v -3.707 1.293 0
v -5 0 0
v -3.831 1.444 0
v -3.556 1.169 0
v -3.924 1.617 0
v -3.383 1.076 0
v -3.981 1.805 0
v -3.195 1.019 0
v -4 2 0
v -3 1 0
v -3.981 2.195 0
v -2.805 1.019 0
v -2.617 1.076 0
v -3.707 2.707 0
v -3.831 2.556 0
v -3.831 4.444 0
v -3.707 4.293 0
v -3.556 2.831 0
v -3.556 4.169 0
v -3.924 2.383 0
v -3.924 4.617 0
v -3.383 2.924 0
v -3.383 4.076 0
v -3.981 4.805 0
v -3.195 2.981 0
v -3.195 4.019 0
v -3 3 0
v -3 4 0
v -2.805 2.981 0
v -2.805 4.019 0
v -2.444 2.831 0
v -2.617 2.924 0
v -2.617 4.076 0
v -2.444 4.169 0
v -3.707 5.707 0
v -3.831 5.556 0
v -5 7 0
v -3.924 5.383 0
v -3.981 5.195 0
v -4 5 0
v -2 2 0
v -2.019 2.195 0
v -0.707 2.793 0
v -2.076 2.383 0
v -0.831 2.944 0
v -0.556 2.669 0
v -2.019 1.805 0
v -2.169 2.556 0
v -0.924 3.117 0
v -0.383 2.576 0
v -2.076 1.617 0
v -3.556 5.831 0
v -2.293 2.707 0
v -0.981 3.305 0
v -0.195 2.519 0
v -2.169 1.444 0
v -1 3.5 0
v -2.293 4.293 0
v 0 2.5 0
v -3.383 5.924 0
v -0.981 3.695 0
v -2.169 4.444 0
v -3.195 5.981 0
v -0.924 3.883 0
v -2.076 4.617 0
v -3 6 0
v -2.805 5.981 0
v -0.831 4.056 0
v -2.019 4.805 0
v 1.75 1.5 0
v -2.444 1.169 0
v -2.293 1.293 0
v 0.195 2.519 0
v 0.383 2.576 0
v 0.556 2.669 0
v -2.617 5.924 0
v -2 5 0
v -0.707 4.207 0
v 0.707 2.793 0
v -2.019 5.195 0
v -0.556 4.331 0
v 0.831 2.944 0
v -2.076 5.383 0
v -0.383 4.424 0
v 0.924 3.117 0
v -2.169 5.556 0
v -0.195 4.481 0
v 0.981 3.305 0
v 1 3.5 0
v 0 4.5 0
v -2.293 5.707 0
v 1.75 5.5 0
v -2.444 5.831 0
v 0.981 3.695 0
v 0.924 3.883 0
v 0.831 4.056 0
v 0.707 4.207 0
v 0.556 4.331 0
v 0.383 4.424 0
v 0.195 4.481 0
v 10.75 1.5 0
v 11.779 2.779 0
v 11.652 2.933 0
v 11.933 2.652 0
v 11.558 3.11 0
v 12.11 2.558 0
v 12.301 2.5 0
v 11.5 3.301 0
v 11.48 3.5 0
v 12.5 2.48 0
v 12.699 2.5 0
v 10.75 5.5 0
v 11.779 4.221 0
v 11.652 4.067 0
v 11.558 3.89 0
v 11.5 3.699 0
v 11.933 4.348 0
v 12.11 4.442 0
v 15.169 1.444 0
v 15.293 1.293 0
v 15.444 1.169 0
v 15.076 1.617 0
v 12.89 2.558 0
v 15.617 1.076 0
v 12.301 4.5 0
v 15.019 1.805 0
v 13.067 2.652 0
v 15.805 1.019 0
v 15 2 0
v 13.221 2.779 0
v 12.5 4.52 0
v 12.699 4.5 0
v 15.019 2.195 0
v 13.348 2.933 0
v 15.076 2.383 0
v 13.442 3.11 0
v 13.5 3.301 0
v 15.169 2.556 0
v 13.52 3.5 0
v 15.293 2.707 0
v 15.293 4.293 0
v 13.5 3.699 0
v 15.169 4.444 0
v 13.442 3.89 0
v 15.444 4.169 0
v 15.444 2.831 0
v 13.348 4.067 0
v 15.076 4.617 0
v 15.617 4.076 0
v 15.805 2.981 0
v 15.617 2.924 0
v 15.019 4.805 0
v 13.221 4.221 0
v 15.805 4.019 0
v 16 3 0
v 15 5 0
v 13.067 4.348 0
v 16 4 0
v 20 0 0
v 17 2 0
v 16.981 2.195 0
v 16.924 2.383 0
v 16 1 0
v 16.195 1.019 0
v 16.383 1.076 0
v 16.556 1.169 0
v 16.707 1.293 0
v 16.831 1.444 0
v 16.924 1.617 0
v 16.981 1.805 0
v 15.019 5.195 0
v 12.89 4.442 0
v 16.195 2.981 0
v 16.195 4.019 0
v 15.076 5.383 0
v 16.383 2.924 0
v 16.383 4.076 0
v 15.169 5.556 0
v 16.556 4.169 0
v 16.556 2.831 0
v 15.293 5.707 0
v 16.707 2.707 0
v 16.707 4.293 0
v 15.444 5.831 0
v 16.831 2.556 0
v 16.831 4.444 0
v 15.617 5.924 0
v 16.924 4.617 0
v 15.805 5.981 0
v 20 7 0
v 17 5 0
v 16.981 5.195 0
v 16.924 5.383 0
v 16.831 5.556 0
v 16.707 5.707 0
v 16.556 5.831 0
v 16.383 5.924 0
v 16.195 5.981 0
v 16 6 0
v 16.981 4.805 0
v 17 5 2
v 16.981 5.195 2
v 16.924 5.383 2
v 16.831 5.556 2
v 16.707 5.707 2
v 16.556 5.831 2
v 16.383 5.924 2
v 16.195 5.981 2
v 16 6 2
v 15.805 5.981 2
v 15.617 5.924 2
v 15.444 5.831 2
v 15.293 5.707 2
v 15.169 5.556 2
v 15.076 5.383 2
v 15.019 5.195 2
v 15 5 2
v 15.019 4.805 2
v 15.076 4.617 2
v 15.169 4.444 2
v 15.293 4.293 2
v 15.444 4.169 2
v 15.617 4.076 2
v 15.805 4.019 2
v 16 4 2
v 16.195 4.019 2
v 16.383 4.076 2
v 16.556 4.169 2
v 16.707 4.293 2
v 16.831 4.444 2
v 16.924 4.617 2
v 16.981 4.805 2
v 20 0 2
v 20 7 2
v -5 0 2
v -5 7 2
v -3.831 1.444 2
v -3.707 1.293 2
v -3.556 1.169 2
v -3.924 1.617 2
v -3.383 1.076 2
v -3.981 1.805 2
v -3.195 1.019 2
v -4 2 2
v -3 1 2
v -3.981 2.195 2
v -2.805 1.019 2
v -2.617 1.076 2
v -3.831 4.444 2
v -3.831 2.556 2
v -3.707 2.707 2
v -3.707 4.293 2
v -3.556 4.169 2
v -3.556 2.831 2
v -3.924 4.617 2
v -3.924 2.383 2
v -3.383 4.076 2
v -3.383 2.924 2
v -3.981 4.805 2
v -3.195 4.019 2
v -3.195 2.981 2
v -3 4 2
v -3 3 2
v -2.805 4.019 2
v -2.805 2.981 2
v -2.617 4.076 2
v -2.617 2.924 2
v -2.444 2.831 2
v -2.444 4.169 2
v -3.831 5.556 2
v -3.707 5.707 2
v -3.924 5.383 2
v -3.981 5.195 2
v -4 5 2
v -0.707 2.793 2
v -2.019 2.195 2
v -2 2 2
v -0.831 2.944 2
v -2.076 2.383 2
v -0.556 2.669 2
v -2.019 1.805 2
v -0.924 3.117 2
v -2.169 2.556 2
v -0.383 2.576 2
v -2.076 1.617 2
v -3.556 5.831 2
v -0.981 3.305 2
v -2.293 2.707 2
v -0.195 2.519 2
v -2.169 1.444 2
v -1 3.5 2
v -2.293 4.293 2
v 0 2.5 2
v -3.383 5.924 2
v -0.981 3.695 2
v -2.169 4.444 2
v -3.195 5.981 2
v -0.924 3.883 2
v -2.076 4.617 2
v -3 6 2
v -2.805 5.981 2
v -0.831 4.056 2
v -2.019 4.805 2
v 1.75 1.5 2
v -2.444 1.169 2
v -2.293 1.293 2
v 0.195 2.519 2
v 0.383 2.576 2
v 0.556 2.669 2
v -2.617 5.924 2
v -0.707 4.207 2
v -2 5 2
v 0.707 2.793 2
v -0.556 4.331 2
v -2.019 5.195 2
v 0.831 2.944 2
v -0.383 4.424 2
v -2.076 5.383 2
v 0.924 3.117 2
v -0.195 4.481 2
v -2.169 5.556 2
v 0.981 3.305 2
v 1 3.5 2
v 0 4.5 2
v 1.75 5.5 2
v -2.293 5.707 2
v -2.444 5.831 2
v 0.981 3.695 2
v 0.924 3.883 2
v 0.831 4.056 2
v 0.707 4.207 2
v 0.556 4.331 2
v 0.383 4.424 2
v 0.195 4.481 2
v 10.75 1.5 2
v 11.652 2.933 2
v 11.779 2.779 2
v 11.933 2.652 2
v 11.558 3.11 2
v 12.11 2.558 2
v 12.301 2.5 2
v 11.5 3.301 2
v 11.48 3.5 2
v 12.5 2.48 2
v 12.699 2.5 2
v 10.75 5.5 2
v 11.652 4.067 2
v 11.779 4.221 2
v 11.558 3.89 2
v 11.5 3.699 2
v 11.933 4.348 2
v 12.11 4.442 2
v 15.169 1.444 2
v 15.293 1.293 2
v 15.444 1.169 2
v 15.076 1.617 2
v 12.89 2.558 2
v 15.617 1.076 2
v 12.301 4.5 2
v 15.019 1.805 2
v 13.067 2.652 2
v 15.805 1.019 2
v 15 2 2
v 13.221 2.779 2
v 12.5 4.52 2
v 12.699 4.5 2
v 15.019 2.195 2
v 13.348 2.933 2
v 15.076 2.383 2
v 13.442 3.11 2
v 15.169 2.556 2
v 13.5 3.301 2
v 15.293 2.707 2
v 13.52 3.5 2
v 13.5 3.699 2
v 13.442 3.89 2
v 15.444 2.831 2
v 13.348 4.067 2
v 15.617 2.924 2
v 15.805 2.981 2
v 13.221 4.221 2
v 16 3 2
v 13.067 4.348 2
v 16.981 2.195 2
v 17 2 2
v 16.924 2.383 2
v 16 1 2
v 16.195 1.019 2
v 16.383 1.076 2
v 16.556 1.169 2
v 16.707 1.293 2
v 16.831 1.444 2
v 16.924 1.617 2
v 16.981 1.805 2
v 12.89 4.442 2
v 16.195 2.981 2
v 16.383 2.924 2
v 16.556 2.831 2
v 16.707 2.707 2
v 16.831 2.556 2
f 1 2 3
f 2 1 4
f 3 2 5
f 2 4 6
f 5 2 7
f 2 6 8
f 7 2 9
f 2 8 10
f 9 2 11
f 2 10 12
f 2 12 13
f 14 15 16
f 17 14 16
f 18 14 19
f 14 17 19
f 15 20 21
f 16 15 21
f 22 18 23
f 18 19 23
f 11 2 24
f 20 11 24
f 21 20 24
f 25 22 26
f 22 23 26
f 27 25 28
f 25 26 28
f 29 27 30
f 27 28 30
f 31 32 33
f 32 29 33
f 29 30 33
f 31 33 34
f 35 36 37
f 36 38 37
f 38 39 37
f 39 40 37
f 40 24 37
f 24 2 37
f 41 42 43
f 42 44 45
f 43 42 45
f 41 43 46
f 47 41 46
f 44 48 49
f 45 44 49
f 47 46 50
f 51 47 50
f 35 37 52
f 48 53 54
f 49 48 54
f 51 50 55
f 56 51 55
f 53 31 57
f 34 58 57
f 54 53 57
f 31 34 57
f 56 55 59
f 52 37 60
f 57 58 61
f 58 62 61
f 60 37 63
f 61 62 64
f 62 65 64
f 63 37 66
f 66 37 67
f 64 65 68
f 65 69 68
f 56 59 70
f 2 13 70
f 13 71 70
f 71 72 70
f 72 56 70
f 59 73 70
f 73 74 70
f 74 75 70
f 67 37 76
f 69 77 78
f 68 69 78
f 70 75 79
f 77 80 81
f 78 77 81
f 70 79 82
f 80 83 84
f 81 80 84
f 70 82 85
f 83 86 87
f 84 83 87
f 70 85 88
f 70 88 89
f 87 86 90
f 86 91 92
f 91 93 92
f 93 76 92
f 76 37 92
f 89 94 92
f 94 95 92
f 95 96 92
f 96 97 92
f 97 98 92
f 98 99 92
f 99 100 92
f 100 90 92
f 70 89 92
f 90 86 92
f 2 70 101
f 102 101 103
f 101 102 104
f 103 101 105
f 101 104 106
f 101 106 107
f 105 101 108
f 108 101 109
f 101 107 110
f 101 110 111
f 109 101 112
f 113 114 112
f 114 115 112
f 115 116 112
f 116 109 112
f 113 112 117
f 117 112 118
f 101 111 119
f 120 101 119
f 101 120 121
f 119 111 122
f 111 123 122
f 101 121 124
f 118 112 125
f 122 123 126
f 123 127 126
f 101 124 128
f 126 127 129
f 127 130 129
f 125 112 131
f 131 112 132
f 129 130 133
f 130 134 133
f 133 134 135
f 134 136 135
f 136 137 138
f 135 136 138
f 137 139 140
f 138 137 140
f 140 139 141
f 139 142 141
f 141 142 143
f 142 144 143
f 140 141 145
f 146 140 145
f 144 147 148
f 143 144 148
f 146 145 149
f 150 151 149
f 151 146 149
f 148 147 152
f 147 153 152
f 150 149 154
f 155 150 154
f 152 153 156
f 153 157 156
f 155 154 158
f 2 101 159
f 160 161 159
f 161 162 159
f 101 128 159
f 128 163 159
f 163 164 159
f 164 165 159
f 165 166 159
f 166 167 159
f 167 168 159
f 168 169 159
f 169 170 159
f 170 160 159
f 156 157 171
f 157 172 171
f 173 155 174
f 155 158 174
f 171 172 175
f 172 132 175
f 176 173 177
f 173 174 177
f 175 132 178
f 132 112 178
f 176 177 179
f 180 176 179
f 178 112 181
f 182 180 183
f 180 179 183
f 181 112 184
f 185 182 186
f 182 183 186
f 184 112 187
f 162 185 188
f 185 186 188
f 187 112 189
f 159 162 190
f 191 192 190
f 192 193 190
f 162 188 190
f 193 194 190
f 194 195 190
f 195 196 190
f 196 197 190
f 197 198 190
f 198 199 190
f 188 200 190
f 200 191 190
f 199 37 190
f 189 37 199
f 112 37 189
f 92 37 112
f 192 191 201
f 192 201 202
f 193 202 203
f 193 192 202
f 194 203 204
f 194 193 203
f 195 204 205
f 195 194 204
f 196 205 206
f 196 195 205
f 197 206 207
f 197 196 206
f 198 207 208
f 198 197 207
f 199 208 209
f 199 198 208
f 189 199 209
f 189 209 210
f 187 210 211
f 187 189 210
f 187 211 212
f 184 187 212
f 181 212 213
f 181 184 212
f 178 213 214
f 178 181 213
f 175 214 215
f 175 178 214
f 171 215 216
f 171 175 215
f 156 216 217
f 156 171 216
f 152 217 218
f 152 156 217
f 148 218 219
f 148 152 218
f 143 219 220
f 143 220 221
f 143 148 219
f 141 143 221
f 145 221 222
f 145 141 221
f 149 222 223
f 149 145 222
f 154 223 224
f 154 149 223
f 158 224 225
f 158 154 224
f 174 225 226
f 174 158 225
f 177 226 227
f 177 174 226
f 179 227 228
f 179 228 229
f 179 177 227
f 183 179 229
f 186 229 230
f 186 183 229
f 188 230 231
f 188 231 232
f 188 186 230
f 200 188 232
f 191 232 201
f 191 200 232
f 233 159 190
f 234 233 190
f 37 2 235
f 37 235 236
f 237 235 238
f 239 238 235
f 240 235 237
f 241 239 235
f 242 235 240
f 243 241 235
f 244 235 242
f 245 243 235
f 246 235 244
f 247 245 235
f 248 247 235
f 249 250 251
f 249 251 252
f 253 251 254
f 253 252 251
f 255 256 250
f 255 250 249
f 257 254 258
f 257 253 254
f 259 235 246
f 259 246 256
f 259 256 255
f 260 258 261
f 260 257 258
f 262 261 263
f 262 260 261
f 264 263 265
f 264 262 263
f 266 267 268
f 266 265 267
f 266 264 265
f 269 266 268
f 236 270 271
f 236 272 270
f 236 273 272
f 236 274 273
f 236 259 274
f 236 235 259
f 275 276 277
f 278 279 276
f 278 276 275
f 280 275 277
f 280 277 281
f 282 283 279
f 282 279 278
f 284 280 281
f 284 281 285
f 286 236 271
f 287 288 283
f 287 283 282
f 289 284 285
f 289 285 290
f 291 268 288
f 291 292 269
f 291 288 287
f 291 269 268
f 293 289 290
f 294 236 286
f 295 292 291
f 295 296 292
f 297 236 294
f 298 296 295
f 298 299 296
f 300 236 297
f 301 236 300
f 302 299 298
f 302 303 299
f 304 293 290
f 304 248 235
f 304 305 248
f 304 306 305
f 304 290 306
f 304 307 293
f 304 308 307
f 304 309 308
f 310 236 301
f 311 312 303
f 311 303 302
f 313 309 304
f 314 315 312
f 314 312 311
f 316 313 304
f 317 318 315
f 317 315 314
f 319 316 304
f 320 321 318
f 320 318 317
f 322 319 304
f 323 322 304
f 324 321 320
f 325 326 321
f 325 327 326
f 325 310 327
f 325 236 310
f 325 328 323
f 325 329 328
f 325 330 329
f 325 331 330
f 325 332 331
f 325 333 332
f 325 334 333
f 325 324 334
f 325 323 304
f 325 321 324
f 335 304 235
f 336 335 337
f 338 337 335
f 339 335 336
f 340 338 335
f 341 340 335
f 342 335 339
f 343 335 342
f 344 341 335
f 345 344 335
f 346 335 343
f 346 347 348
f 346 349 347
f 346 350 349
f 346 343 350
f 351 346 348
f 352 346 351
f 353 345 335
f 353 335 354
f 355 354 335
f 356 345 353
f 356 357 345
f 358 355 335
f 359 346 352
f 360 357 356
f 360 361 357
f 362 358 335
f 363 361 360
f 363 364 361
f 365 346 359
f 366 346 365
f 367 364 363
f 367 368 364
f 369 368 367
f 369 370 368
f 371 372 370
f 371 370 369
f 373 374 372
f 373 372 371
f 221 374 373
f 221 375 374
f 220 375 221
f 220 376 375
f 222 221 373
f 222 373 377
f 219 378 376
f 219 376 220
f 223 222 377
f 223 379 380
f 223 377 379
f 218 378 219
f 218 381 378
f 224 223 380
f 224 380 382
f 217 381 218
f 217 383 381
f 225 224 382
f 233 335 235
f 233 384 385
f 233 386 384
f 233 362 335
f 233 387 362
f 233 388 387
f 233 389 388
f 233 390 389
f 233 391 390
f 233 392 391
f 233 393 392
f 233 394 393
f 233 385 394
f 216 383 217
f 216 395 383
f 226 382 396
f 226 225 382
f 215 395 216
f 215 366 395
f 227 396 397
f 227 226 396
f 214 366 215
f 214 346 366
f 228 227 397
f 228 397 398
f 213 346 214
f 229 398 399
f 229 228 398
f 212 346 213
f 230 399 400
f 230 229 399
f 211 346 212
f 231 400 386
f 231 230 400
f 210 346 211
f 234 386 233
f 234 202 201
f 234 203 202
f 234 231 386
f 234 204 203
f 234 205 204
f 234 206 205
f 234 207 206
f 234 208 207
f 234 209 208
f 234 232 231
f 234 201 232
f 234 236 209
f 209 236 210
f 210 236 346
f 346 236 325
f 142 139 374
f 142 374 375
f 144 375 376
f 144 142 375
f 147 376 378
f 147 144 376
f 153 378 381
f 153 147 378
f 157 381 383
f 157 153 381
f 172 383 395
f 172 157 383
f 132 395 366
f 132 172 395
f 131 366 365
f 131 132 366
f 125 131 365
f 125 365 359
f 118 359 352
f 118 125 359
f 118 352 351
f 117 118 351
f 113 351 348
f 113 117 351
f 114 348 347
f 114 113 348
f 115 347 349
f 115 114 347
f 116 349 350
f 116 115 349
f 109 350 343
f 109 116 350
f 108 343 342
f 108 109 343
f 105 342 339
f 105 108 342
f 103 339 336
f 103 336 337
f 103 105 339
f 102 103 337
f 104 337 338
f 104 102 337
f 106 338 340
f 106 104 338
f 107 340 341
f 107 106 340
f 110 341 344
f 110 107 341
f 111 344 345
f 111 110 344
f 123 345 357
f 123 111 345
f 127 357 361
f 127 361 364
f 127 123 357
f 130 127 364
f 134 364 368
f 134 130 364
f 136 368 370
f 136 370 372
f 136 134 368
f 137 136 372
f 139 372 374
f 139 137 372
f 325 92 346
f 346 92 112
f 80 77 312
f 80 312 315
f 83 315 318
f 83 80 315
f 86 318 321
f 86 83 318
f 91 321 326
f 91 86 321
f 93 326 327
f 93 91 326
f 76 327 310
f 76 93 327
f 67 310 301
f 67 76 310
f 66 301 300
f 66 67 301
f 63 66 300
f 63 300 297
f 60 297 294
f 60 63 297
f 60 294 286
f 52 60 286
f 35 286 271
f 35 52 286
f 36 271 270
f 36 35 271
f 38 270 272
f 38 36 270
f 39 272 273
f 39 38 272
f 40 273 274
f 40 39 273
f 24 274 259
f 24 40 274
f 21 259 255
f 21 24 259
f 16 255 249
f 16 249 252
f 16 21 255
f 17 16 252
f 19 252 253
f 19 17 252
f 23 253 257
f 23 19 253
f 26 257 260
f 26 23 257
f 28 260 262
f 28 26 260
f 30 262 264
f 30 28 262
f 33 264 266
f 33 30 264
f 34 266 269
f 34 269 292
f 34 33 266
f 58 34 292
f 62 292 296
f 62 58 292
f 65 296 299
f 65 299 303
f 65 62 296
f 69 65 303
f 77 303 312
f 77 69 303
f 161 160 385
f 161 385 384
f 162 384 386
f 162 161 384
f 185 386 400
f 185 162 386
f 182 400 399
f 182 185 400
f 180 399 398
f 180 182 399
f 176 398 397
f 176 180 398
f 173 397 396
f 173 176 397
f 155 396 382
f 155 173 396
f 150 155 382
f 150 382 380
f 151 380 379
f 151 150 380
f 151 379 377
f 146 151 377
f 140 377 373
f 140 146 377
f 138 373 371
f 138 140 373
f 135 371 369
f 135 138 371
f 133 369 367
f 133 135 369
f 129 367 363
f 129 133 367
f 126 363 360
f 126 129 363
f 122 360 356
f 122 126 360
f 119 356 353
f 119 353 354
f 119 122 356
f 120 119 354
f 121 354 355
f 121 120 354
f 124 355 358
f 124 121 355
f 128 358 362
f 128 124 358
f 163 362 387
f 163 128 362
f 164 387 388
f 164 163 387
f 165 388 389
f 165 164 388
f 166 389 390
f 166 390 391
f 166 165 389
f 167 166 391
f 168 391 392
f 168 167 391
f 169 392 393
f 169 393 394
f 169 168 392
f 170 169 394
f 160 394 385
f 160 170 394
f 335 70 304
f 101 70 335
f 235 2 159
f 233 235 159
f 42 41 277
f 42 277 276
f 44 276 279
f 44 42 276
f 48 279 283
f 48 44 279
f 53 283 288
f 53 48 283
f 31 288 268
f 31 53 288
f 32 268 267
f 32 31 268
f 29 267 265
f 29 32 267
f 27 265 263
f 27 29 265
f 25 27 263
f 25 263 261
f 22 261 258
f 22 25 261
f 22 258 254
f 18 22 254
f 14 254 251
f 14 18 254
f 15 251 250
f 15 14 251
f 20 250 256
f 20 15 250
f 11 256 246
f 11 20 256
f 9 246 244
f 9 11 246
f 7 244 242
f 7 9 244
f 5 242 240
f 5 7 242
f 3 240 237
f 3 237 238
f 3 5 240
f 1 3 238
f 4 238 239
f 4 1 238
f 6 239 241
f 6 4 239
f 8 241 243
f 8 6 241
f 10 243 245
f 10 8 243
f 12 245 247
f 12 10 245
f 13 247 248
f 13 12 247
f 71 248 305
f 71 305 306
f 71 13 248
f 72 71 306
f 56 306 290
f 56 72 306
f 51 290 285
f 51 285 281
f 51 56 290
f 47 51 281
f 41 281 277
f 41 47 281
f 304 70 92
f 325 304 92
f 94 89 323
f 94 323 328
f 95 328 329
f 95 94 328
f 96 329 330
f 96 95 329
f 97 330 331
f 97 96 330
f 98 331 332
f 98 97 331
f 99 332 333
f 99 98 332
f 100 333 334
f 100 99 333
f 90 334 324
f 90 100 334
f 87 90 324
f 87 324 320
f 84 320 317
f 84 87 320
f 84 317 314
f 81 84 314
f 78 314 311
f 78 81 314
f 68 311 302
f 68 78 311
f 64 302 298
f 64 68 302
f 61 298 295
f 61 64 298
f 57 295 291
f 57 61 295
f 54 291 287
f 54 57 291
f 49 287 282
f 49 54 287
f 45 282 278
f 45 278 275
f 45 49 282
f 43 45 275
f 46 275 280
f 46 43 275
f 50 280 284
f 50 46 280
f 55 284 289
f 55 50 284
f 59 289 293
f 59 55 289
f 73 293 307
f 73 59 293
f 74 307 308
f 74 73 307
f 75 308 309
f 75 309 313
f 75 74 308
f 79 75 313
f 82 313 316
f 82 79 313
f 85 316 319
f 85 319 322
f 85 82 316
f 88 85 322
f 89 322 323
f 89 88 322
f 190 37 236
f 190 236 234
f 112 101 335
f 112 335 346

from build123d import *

# Parameters (mm, degrees)
CYLINDER005_R     = 1
CYLINDER005_DEPTH = 2
CYLINDER004_R     = 1
CYLINDER004_DEPTH = 2
CYLINDER003_R     = 1
CYLINDER003_DEPTH = 2
CYLINDER002_R     = 1
CYLINDER002_DEPTH = 2
CYLINDER001_R     = 1
CYLINDER001_DEPTH = 2
CYLINDER_R        = 1.02
CYLINDER_DEPTH    = 2
BOX001_W          = 9
BOX001_H          = 4
BOX001_DEPTH      = 2
BOX_W             = 25
BOX_H             = 7
BOX_DEPTH         = 2


with BuildPart() as cylinder005:
    # Cylinder005 → Cylinder005 (new body)
    with BuildSketch(Plane(origin=(16, 5, 0), x_dir=(1, 0, 0), z_dir=(0, 0, 1))):
        Circle(CYLINDER005_R)
    extrude(amount=CYLINDER005_DEPTH)


with BuildPart() as cylinder004:
    # Cylinder004 → Cylinder004 (new body)
    with BuildSketch(Plane(origin=(16, 2, 0), x_dir=(1, 0, 0), z_dir=(0, 0, 1))):
        Circle(CYLINDER004_R)
    extrude(amount=CYLINDER004_DEPTH)


with BuildPart() as cylinder003:
    # Cylinder003 → Cylinder003 (new body)
    with BuildSketch(Plane(origin=(-3, 2, 0), x_dir=(1, 0, 0), z_dir=(0, 0, 1))):
        Circle(CYLINDER003_R)
    extrude(amount=CYLINDER003_DEPTH)


with BuildPart() as cylinder002:
    # Cylinder002 → Cylinder002 (new body)
    with BuildSketch(Plane(origin=(-3, 5, 0), x_dir=(1, 0, 0), z_dir=(0, 0, 1))):
        Circle(CYLINDER002_R)
    extrude(amount=CYLINDER002_DEPTH)


with BuildPart() as cylinder001:
    # Cylinder001 → Cylinder001 (new body)
    with BuildSketch(Plane(origin=(0, 3.5, 0), x_dir=(1, 0, 0), z_dir=(0, 0, 1))):
        Circle(CYLINDER001_R)
    extrude(amount=CYLINDER001_DEPTH)


with BuildPart() as cylinder:
    # Cylinder → Cylinder (new body)
    with BuildSketch(Plane(origin=(12.5, 3.5, 0), x_dir=(1, 0, 0), z_dir=(0, 0, 1))):
        Circle(CYLINDER_R)
    extrude(amount=CYLINDER_DEPTH)


with BuildPart() as cube001:
    # Box001 → Box001 (new body)
    with BuildSketch(Plane(origin=(1.75, 1.5, 0), x_dir=(1, 0, 0), z_dir=(0, 0, 1))):
        with Locations((4.5, 2)):
            Rectangle(BOX001_W, BOX001_H)
    extrude(amount=BOX001_DEPTH)


with BuildPart() as cut006:
    # Box → Box (new body)
    with BuildSketch(Plane(origin=(-5, 0, 0), x_dir=(1, 0, 0), z_dir=(0, 0, 1))):
        with Locations((12.5, 3.5)):
            Rectangle(BOX_W, BOX_H)
    extrude(amount=BOX_DEPTH)

    # Cut: cut Cube001
    add(cube001.part, mode=Mode.SUBTRACT)

    # Cut001: cut Cylinder
    add(cylinder.part, mode=Mode.SUBTRACT)

    # Cut002: cut Cylinder001
    add(cylinder001.part, mode=Mode.SUBTRACT)

    # Cut003: cut Cylinder002
    add(cylinder002.part, mode=Mode.SUBTRACT)

    # Cut004: cut Cylinder003
    add(cylinder003.part, mode=Mode.SUBTRACT)

    # Cut005: cut Cylinder004
    add(cylinder004.part, mode=Mode.SUBTRACT)

    # Cut006: cut Cylinder005
    add(cylinder005.part, mode=Mode.SUBTRACT)


solid = cut006.part
